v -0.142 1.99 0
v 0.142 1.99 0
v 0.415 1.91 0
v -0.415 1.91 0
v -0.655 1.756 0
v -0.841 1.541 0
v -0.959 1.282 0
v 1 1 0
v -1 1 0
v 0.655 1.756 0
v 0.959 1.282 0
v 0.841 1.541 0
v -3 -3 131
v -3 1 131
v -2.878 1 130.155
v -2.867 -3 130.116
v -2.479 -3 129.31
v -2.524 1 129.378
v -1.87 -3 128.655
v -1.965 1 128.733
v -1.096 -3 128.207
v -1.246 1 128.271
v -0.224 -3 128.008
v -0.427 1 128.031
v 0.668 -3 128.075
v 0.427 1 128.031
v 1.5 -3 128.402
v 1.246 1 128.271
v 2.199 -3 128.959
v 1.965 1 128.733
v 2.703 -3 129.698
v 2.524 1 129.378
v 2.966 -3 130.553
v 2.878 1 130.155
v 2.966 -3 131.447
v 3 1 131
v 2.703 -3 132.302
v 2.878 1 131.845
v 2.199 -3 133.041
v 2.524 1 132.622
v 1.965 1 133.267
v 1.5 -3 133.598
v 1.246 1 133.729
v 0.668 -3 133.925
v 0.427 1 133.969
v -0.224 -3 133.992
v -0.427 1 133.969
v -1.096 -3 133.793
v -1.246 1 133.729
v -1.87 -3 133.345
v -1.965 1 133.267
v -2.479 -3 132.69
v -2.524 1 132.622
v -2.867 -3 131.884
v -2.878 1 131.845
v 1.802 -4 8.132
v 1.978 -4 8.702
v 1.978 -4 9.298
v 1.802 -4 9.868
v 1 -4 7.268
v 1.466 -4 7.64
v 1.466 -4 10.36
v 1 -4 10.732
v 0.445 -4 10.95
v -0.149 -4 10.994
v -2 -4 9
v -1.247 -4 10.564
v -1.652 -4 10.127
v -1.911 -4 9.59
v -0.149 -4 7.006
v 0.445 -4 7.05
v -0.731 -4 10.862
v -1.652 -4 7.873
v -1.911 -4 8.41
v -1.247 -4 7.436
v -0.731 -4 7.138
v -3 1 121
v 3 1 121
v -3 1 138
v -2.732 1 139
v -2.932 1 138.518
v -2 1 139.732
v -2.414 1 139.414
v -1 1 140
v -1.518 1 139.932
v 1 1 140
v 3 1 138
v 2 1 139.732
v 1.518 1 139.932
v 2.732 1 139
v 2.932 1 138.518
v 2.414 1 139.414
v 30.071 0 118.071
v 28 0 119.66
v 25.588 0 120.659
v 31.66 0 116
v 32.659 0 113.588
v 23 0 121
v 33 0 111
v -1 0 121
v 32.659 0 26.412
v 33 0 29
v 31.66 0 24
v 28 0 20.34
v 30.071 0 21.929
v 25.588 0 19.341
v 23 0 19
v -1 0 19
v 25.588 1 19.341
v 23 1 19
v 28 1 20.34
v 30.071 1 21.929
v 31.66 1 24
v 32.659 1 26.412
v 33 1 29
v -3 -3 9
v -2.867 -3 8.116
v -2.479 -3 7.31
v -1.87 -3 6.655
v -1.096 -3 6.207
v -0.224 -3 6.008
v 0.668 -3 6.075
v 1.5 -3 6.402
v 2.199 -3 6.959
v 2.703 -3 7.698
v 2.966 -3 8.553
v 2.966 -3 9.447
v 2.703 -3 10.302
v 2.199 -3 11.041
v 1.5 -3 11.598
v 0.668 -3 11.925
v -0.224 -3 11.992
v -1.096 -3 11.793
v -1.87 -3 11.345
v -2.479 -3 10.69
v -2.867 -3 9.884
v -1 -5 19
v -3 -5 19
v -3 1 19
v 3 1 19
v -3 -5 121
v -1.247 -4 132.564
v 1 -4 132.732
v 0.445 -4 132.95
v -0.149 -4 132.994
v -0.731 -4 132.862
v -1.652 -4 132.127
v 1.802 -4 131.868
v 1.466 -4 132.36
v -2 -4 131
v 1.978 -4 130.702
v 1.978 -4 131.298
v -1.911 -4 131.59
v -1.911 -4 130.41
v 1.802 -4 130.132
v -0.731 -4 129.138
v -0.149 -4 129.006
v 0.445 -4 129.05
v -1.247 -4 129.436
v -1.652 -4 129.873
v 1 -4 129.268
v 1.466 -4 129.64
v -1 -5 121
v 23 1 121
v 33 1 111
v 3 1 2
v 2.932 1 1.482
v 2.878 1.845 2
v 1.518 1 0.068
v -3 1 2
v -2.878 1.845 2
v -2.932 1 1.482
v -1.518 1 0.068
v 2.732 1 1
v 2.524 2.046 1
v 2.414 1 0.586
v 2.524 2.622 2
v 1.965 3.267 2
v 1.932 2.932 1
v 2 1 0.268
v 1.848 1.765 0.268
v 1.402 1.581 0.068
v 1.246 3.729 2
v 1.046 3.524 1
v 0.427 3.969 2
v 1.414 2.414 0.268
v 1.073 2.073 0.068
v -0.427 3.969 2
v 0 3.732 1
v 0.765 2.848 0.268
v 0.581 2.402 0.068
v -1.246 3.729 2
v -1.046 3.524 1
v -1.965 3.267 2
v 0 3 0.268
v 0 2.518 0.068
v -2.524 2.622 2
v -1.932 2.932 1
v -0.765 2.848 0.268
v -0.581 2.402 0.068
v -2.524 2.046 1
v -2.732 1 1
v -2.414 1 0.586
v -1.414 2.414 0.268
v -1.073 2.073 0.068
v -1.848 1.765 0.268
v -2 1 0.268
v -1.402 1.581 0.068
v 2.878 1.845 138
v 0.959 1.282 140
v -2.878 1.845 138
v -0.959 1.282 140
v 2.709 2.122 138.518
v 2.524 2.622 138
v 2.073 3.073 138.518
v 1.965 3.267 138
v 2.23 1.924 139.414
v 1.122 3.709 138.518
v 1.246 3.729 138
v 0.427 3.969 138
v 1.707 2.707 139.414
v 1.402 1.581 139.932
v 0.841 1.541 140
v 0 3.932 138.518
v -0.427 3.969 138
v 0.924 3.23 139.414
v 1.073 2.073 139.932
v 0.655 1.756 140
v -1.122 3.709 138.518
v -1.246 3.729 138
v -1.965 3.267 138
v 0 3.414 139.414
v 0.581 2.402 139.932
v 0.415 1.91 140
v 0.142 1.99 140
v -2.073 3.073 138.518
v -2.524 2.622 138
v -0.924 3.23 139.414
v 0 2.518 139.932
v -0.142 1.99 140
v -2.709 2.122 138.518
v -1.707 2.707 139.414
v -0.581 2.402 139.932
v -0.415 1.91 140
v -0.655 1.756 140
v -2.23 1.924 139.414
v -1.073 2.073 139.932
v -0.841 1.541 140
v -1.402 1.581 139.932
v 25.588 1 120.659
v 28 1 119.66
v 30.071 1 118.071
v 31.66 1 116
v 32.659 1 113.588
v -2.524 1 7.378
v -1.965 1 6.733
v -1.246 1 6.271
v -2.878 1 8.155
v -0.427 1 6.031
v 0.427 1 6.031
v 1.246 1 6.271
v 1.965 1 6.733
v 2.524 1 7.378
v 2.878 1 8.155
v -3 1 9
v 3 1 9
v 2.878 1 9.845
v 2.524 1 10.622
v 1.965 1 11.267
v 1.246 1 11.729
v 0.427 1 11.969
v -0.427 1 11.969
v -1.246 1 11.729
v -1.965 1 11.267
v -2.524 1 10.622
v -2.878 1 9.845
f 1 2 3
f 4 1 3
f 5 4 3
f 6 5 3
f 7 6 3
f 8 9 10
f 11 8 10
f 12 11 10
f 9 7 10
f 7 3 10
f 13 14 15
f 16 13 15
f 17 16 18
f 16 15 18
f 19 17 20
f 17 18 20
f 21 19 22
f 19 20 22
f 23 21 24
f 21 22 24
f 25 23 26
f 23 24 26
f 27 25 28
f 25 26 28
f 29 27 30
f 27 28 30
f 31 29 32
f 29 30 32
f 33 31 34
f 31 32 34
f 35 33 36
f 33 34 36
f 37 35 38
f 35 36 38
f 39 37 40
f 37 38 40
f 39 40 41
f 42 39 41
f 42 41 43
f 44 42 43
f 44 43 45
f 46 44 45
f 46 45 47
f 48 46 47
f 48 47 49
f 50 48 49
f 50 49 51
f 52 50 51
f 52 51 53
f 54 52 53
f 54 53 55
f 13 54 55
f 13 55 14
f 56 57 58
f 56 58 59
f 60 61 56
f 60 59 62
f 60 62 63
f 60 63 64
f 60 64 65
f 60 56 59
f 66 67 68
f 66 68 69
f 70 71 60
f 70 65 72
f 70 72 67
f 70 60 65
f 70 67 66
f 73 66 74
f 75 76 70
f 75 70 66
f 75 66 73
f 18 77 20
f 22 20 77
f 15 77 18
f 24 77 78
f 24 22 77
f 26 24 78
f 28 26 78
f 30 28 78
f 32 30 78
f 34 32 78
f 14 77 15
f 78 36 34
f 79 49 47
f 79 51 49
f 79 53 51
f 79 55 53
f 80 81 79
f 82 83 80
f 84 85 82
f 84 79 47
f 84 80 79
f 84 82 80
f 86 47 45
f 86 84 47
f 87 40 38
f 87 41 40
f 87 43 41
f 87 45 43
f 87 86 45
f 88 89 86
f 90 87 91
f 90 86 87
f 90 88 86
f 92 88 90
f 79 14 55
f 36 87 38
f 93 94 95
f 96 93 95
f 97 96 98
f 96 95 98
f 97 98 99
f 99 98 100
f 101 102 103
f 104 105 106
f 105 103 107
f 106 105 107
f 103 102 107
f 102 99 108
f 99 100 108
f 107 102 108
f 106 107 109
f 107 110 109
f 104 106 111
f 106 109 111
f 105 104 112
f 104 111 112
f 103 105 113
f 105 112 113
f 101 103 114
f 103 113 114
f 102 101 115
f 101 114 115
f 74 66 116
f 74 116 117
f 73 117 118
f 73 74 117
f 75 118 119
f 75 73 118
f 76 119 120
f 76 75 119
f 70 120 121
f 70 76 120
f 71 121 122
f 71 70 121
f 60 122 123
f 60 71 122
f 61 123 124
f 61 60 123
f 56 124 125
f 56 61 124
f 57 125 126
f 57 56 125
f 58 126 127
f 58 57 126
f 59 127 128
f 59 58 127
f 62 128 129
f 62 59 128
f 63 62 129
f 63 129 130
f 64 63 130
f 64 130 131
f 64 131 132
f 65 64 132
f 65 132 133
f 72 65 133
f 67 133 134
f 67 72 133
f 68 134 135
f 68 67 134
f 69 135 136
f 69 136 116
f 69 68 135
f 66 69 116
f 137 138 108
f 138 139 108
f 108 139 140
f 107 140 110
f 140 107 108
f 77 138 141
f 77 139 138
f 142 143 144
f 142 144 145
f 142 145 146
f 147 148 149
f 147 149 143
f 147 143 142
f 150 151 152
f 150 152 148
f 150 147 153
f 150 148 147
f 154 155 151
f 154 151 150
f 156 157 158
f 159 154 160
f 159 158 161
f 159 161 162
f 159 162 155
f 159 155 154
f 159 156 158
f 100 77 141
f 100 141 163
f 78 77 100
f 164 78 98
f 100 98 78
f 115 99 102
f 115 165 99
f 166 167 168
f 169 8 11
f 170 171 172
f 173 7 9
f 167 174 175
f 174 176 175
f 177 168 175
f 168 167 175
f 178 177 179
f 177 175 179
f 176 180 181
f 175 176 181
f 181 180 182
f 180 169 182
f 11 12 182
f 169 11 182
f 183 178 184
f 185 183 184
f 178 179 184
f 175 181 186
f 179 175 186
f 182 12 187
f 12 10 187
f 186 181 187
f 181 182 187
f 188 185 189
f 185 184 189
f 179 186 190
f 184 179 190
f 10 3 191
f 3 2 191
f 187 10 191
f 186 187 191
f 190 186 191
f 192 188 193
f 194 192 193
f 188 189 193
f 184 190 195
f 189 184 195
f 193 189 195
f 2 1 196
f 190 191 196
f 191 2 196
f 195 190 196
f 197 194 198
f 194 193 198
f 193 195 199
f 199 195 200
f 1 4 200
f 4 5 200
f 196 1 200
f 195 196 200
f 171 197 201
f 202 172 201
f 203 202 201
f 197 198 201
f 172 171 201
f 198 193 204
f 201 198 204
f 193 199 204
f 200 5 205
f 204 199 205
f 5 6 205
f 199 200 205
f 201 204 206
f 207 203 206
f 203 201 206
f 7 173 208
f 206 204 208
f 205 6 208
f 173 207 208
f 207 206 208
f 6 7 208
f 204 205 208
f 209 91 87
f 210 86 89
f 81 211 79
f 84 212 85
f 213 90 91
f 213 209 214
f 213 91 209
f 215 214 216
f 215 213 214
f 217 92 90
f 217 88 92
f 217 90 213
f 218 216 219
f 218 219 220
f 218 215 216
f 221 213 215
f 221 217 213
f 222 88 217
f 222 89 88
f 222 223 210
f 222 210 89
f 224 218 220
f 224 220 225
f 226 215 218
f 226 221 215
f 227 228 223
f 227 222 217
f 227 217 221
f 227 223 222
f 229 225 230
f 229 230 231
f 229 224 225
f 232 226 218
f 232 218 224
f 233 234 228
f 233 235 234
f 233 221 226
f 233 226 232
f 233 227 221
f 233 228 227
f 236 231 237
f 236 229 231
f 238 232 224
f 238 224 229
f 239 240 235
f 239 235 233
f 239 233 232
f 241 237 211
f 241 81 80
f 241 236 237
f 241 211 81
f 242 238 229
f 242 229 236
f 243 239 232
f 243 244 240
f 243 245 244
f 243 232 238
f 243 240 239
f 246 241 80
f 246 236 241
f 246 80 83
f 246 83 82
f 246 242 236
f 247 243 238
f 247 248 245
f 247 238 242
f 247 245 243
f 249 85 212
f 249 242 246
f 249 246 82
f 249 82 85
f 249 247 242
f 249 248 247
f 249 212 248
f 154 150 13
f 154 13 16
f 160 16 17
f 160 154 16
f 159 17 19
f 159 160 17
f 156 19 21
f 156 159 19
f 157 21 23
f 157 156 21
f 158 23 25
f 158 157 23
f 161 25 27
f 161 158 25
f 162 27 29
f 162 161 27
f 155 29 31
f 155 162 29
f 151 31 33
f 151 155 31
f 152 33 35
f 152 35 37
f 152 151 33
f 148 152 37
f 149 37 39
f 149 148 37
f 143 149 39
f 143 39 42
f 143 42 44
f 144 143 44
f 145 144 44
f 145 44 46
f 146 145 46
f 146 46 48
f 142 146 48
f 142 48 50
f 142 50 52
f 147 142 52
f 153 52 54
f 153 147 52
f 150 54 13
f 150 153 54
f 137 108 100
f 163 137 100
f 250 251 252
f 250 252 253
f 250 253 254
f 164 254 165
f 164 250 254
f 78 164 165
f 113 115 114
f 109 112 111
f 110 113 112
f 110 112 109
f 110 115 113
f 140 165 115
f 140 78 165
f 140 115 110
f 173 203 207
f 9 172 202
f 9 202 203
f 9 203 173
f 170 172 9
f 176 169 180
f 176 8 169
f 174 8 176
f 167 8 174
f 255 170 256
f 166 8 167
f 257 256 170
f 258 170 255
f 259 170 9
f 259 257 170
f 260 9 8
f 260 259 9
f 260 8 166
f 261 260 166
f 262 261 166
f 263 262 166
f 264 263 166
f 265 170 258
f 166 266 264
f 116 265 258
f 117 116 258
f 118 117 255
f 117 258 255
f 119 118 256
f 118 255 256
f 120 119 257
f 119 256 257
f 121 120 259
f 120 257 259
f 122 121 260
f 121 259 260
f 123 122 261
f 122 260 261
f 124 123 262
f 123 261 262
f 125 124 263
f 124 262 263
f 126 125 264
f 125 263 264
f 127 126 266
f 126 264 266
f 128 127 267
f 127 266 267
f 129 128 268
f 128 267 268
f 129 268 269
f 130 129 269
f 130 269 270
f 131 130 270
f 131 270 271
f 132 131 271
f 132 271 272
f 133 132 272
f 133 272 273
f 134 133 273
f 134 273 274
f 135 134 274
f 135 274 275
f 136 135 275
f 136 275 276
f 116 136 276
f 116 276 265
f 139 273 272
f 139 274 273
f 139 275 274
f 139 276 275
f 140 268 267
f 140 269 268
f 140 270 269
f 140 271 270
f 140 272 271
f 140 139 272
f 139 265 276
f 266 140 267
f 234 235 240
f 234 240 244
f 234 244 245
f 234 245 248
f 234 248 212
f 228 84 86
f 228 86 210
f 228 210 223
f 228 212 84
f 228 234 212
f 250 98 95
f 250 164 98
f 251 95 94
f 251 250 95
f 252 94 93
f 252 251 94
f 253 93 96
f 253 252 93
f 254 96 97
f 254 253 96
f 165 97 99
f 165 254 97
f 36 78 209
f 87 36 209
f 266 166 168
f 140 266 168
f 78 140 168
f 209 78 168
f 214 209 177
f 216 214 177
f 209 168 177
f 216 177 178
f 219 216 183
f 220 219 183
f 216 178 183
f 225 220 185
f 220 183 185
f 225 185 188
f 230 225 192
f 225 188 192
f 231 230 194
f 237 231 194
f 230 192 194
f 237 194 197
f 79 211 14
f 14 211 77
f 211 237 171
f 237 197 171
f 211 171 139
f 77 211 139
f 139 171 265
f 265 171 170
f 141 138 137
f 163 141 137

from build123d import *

# Parameters (mm, degrees)
EXTRUDE_2_DEPTH     = 140
SKETCH_4_W          = 6
SKETCH_4_H          = 19
CUT_EXTRUDE_1_DEPTH = 1
SKETCH_3_R          = 3
EXTRUDE_4_DEPTH     = 5
CHAMFER_2_SIZE      = 1
FILLET_2_R          = 2
SKETCH_6_W          = 102
SKETCH_6_H          = 1
EXTRUDE_5_DEPTH     = 30
FILLET_3_R          = 10
SKETCH_7_W          = 2
SKETCH_7_H          = 102
EXTRUDE_6_DEPTH     = 5


with BuildPart() as part:
    # 草图2 → 凸台-拉伸2 (new body)
    with BuildSketch(Plane.XY):
        with BuildLine():
            Line((-3, 0), (3, 0))
            Line((3, 0), (3, 1))
            ThreePointArc((3, 1), (0, 4), (-3, 1))
            Line((-3, 1), (-3, 0))
        make_face()
    extrude(amount=EXTRUDE_2_DEPTH)

    # 草图4 → 切除-拉伸1 (cut)
    with BuildSketch(Plane.XZ):
        with Locations((0, 130.5)):
            Rectangle(SKETCH_4_W, SKETCH_4_H)
        with Locations((0, 9.5)):
            Rectangle(SKETCH_4_W, SKETCH_4_H)
    extrude(amount=-CUT_EXTRUDE_1_DEPTH, mode=Mode.SUBTRACT)

    # 草图3 → 凸台-拉伸4 (add)
    with BuildSketch(Plane.XZ.offset(-1)):
        with Locations(Location((0, 131, 0), (0, 0, 180))):
            Circle(SKETCH_3_R)
        with Locations(Location((0, 9, 0), (0, 0, 180))):
            Circle(SKETCH_3_R)
    extrude(amount=EXTRUDE_4_DEPTH)

    # 倒角2
    chamfer_2_edges = [part.edges().sort_by_distance(p)[0] for p in [
        (3, -4, 131),
        (3, -4, 9),
    ]]
    chamfer(chamfer_2_edges, length=CHAMFER_2_SIZE)

    # 圆角2
    fillet_2_edges = [part.edges().sort_by_distance(p)[0] for p in [
        (0, 4, 140),
        (0, 4, 0),
    ]]
    fillet(fillet_2_edges, radius=FILLET_2_R)

    # 草图6 → 凸台-拉伸5 (add)
    with BuildSketch(Plane(origin=(3, 0, 0), x_dir=(0, 0, -1), z_dir=(1, 0, 0))):
        with Locations((-70, 0.5)):
            Rectangle(SKETCH_6_W, SKETCH_6_H)
    extrude(amount=EXTRUDE_5_DEPTH)

    # 圆角3
    fillet_3_edges = [part.edges().sort_by_distance(p)[0] for p in [
        (33, 0.5, 121),
        (33, 0.5, 19),
    ]]
    fillet(fillet_3_edges, radius=FILLET_3_R)

    # 草图7 → 凸台-拉伸6 (add)
    with BuildSketch(Plane.XZ):
        with Locations((-2, 70)):
            Rectangle(SKETCH_7_W, SKETCH_7_H)
    extrude(amount=EXTRUDE_6_DEPTH)


solid = part.part
